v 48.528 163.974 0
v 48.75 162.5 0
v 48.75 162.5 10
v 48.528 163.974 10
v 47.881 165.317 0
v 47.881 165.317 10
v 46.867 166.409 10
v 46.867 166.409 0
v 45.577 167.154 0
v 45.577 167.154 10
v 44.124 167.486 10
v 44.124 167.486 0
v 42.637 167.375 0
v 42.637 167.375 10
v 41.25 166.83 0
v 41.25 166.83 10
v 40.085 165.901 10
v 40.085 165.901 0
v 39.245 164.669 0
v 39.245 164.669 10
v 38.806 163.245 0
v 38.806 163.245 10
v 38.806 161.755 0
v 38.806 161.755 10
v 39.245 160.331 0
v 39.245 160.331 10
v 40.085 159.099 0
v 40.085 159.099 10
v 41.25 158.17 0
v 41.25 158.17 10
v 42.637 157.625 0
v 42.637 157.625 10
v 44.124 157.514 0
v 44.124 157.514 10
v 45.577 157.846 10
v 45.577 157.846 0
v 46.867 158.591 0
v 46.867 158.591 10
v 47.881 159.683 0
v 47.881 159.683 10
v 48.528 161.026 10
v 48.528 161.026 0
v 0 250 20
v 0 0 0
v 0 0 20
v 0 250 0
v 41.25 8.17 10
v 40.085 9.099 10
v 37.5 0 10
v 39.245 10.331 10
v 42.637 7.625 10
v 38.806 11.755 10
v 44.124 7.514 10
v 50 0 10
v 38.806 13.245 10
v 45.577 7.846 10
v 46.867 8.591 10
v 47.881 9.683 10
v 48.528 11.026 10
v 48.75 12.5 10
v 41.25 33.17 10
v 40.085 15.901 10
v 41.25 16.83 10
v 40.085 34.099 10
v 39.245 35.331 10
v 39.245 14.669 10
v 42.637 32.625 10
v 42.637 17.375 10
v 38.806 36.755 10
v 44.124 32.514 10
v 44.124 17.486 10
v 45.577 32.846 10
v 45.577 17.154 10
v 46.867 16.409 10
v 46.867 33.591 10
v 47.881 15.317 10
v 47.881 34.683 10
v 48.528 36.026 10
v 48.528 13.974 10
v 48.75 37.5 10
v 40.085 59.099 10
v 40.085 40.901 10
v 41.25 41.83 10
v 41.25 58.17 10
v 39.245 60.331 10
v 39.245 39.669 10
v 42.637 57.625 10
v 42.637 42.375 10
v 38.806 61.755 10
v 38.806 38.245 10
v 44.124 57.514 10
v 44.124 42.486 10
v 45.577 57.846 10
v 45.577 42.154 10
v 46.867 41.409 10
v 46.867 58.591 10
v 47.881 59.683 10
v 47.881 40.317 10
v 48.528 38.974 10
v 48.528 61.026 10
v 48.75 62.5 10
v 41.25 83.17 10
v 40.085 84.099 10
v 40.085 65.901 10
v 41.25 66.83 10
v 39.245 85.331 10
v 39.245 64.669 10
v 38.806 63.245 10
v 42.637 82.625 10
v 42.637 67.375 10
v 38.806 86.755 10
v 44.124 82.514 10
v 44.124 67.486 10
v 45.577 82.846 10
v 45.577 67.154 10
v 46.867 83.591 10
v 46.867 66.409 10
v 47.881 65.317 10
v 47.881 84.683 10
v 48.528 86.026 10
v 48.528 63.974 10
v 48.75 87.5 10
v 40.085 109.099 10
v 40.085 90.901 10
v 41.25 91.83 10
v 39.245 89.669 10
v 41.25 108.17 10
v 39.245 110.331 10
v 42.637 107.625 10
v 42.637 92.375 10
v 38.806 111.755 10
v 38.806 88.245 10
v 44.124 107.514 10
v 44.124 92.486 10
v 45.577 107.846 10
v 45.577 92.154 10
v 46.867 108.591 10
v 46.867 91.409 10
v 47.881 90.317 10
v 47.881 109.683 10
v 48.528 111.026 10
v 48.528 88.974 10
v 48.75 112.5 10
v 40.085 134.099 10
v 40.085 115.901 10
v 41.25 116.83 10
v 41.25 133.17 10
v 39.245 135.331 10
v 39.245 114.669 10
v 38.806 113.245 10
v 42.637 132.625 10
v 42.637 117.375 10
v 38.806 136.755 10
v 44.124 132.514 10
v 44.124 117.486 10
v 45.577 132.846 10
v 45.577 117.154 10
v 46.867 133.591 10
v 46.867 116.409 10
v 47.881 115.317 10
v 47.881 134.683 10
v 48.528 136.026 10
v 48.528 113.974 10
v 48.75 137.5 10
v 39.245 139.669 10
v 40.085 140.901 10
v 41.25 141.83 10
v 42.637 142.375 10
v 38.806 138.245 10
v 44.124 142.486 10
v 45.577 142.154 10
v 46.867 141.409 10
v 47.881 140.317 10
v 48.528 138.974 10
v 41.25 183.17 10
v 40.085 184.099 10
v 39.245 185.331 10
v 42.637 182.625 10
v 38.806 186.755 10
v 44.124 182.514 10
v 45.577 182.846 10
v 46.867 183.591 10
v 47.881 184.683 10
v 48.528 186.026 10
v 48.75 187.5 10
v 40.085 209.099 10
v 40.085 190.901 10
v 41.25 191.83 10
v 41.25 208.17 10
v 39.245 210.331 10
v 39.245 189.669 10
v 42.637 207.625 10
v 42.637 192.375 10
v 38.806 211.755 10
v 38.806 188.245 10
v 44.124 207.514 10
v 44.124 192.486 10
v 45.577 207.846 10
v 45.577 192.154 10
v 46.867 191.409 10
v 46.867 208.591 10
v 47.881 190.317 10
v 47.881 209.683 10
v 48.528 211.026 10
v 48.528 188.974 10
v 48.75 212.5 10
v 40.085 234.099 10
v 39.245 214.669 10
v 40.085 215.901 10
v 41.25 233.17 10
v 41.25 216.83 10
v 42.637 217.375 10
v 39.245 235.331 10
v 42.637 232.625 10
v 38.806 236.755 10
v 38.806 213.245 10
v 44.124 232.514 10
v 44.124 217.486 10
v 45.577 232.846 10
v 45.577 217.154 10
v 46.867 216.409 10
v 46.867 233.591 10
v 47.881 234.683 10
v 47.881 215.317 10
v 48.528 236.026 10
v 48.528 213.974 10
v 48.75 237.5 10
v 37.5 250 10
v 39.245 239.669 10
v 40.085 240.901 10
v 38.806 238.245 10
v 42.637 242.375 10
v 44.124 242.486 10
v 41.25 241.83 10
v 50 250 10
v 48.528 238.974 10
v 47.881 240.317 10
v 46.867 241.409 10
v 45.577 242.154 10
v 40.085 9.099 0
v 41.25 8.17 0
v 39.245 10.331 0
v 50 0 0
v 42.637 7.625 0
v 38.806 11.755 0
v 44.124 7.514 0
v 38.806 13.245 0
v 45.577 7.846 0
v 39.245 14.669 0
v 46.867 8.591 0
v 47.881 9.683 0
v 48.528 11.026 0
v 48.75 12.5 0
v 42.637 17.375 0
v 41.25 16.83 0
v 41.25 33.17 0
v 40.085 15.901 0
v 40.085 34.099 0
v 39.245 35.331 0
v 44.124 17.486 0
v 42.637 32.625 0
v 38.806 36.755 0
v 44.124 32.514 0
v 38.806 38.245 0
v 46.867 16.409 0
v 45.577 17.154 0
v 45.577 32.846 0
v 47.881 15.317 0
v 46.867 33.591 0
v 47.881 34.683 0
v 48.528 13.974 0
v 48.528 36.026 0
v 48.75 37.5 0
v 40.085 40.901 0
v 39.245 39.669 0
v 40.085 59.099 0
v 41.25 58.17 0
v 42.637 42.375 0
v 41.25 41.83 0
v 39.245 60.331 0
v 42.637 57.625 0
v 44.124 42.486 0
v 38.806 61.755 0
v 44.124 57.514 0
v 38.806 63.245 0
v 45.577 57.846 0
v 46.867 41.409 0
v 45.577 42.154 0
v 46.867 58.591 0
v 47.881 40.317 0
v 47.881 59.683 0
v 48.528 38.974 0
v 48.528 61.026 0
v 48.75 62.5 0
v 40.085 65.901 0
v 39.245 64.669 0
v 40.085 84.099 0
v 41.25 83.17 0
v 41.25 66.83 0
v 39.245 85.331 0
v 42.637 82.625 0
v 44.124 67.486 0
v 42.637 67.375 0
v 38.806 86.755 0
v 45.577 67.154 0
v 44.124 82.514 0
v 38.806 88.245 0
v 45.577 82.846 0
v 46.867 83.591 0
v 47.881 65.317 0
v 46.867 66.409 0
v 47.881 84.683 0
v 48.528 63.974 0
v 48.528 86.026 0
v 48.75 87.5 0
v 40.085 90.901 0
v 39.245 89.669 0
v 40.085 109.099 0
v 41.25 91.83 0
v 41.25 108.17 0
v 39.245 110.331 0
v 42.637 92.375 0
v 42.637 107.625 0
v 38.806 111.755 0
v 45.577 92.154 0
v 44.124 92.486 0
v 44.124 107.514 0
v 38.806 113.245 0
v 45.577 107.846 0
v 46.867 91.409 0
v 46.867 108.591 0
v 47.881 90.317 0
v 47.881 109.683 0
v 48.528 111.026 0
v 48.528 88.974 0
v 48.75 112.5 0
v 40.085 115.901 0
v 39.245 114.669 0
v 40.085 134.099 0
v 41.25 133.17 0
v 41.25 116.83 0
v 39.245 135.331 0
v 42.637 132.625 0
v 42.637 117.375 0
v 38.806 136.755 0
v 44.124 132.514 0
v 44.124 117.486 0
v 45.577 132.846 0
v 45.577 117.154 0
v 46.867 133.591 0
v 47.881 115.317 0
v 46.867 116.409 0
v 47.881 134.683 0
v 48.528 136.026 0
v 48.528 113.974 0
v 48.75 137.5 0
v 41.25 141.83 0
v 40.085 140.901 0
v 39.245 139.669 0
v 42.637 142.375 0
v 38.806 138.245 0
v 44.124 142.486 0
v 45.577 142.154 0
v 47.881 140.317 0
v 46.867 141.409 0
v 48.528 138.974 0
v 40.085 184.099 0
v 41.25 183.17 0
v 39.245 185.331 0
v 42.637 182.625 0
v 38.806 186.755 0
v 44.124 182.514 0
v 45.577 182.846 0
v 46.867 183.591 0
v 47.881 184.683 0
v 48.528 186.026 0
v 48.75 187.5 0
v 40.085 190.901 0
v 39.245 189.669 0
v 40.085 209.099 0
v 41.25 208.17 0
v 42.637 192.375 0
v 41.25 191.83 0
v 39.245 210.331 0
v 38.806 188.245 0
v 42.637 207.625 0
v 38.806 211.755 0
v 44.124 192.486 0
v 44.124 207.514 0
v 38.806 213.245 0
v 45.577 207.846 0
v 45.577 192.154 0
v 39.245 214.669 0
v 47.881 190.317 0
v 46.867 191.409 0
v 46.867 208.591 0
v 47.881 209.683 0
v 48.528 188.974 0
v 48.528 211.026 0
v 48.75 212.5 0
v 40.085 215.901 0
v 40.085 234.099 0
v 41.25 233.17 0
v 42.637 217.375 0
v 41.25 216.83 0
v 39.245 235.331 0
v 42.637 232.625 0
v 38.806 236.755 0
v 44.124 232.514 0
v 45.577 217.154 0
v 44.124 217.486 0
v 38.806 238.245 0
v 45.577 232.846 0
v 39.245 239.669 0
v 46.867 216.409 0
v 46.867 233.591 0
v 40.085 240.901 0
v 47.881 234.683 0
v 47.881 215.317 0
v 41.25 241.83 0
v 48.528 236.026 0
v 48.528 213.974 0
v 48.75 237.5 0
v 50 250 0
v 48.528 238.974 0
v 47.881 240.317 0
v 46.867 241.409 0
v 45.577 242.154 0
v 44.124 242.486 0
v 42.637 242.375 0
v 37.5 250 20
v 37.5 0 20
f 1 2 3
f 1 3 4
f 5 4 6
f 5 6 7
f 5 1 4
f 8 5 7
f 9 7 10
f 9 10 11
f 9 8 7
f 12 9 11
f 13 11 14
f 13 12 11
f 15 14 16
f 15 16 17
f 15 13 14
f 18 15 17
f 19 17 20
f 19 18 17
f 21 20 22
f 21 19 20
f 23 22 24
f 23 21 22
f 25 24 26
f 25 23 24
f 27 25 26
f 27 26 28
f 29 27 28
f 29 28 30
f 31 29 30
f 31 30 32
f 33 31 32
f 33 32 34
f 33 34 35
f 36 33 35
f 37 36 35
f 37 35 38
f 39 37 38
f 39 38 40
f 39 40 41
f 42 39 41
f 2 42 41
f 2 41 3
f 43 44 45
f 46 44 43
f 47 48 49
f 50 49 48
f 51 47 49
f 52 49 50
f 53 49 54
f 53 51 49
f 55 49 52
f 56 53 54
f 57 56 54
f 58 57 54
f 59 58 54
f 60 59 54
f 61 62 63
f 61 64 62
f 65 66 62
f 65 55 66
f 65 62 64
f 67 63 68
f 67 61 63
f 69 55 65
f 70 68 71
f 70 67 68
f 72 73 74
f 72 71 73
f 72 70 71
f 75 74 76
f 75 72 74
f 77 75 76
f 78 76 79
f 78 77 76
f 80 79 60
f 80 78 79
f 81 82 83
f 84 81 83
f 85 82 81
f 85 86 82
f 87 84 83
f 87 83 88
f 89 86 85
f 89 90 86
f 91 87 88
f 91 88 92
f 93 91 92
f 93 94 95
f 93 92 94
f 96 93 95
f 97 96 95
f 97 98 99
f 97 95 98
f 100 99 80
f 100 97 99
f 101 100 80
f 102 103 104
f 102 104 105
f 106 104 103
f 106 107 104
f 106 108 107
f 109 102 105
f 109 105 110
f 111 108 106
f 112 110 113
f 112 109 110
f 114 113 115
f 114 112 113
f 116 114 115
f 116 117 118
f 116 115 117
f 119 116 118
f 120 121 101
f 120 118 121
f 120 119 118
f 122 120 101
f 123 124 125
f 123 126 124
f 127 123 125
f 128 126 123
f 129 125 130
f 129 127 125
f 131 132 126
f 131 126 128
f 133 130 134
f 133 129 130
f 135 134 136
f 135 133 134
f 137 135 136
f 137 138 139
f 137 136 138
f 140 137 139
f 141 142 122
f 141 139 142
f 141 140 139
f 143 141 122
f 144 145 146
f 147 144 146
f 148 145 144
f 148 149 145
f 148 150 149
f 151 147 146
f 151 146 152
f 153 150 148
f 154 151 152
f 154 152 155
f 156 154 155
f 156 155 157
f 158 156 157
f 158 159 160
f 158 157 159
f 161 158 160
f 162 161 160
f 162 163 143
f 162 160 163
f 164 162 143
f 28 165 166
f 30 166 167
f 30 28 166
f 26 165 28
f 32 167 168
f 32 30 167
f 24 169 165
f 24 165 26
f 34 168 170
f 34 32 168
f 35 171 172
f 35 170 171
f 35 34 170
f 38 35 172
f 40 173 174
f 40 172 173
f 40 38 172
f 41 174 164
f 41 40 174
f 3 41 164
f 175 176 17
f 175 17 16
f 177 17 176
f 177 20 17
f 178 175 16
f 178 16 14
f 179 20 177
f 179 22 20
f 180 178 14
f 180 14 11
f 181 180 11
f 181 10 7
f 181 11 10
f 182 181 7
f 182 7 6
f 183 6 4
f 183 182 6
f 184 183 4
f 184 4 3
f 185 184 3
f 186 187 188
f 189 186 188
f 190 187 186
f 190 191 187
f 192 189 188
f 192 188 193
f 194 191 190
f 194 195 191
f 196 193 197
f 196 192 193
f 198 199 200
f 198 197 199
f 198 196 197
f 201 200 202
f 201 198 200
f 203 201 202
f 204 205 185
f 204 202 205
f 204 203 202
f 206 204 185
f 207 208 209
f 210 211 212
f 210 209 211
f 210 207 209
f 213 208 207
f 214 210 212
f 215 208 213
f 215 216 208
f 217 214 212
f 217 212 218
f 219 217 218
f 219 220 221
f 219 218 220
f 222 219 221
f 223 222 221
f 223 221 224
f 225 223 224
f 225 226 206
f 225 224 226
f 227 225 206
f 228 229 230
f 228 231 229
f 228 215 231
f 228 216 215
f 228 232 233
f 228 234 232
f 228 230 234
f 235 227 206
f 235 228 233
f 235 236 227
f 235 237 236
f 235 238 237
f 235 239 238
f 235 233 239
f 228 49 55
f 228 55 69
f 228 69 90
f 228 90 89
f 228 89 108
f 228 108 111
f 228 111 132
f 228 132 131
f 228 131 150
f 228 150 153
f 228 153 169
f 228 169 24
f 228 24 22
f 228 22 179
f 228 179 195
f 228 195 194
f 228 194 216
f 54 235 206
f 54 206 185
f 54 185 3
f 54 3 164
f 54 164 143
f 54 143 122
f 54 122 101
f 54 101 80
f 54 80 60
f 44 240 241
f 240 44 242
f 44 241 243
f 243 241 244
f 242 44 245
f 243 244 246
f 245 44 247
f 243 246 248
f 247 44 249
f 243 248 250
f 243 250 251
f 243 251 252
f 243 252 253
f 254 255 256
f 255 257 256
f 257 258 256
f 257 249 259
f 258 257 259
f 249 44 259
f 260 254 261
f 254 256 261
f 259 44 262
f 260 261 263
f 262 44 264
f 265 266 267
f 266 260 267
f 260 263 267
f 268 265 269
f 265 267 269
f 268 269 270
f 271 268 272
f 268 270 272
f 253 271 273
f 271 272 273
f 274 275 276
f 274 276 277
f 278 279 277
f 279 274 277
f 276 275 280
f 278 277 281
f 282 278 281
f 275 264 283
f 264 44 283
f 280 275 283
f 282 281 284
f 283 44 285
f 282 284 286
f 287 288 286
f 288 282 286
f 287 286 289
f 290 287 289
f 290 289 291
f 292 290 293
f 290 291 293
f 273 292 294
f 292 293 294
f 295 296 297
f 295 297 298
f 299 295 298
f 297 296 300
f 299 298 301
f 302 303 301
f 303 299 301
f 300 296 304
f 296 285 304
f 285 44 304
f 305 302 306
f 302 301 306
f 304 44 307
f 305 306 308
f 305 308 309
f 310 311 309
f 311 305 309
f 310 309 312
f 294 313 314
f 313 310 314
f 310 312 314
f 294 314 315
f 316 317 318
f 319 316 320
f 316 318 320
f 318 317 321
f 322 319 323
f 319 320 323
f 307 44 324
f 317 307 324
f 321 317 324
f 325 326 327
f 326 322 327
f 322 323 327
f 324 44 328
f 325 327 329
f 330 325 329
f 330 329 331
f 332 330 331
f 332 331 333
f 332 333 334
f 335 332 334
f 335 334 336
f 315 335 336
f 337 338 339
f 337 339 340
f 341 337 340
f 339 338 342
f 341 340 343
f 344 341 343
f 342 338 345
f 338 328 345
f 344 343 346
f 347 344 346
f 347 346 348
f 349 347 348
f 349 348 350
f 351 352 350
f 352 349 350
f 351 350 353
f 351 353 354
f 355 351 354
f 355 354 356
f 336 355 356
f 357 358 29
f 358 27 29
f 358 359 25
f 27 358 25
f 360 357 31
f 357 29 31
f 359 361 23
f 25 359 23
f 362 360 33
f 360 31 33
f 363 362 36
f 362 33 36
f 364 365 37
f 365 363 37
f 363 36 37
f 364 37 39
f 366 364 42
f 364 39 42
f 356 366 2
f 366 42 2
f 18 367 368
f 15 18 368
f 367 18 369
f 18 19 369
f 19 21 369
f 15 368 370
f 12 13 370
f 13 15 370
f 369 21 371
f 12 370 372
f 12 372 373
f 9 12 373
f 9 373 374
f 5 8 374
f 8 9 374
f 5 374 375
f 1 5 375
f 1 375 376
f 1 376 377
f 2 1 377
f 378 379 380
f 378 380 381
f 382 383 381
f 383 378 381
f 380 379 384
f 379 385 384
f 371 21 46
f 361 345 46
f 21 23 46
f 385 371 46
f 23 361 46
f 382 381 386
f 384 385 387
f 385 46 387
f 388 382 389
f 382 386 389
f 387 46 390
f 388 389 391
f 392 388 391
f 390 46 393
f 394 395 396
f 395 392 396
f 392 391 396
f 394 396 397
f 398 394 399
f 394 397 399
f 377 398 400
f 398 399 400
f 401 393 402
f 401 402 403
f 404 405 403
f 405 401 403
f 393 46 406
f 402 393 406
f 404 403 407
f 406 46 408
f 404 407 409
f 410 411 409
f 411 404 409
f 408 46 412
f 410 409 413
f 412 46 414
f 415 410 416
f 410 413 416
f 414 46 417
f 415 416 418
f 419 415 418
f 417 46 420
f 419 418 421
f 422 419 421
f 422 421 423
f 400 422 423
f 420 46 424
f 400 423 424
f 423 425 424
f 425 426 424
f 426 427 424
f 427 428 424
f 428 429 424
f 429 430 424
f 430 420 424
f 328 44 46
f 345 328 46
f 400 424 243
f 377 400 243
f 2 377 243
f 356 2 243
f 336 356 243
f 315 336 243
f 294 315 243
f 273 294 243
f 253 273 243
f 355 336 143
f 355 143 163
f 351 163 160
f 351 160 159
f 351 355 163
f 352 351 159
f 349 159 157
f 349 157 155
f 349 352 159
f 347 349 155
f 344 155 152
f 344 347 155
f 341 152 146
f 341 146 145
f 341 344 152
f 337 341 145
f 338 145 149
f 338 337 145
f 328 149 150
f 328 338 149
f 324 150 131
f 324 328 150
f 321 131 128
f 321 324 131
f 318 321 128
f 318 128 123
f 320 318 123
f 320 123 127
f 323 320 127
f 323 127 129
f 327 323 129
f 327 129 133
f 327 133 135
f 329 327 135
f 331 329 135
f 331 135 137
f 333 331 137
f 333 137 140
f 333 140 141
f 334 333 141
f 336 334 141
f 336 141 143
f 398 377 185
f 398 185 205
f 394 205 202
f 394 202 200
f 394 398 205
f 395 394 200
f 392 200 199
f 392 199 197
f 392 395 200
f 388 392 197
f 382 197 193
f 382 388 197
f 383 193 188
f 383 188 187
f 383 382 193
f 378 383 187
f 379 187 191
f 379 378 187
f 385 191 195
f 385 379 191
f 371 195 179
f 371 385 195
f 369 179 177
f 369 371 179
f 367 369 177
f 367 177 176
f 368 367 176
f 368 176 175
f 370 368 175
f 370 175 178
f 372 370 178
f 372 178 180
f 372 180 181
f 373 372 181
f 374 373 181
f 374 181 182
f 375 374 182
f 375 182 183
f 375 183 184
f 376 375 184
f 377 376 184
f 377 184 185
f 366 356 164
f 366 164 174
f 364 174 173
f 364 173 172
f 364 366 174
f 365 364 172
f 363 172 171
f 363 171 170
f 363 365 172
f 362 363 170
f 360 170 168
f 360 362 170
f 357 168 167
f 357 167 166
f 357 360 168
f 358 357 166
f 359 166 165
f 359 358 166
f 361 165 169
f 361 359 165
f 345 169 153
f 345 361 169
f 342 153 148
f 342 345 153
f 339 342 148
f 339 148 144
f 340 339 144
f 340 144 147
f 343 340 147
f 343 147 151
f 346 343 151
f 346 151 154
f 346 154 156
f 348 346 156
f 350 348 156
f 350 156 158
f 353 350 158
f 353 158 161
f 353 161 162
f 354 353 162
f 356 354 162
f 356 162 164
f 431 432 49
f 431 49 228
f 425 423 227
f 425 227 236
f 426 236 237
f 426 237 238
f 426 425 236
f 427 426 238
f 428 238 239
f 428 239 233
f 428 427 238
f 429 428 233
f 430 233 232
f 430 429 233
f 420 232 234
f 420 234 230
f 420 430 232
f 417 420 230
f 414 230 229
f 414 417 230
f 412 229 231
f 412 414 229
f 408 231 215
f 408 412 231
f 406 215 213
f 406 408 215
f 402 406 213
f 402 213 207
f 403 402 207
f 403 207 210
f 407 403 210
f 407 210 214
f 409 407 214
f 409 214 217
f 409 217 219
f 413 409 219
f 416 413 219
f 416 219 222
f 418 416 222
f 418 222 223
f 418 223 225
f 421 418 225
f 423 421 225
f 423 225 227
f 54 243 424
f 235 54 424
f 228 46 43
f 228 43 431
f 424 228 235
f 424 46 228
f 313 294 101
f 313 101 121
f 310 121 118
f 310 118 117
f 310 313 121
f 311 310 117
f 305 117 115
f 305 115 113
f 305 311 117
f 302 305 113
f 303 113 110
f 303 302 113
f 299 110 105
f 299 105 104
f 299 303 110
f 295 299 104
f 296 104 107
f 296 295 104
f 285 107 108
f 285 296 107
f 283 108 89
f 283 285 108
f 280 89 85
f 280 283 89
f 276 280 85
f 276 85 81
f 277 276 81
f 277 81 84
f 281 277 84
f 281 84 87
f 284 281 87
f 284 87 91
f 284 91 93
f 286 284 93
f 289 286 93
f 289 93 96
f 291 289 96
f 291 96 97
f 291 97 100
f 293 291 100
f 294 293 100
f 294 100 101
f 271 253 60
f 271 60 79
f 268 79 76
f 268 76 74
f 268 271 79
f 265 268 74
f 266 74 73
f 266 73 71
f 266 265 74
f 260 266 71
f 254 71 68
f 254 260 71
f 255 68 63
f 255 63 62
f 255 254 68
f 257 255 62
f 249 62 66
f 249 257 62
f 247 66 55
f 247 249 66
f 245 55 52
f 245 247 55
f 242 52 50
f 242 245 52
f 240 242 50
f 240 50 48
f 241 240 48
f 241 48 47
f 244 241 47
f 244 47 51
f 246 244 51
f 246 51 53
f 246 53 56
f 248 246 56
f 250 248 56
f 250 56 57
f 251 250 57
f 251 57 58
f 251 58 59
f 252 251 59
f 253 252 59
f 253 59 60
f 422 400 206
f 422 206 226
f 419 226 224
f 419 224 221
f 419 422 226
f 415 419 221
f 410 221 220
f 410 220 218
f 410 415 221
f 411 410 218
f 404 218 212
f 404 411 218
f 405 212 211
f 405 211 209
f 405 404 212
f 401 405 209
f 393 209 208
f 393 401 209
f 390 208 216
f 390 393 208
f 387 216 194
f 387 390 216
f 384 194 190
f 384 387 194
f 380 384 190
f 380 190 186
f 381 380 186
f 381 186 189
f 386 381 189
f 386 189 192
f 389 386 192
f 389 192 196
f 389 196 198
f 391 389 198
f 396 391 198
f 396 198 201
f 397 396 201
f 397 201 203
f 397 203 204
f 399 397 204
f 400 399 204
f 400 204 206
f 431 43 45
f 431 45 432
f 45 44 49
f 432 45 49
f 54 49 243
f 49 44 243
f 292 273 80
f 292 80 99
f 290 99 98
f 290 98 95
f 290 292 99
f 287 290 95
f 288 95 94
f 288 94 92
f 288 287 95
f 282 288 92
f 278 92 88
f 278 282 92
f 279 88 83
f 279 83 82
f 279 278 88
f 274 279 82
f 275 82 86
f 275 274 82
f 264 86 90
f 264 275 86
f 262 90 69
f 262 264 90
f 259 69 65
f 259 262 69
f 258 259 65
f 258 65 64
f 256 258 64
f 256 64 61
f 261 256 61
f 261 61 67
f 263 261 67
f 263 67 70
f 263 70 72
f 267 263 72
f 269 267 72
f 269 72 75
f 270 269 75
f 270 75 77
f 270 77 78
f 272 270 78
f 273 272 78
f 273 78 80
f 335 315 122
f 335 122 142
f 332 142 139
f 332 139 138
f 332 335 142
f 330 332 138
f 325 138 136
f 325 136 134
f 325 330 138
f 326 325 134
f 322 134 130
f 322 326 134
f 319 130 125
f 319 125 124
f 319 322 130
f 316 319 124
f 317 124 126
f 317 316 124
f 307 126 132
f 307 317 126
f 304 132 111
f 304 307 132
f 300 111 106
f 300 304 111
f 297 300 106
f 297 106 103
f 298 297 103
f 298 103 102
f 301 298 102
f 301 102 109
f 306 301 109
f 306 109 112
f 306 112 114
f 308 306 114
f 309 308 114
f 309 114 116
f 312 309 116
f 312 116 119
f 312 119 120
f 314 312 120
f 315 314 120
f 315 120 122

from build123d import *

# Parameters (mm, degrees)
SKETCH1_W           = 50
SKETCH1_H           = 250
BOSS_EXTRUDE2_DEPTH = 20
SKETCH1_4_W         = 50
SKETCH1_4_H         = 250
BOSS_EXTRUDE3_DEPTH = 10
SKETCH1_8_R         = 5
CUT_EXTRUDE7_DEPTH  = 20
CUT_EXTRUDE8_START  = -10
SKETCH4_W           = 12.5
SKETCH4_H           = 250
SKETCH4_R           = 5
CUT_EXTRUDE8_DEPTH  = 10


with BuildPart() as part:
    # Sketch1 → Boss-Extrude2 (new body)
    with BuildSketch(Plane.XY):
        with Locations((25, 125)):
            Rectangle(SKETCH1_W, SKETCH1_H)
    extrude(amount=BOSS_EXTRUDE2_DEPTH)

    # Sketch1_4 → Boss-Extrude3 (add)
    with BuildSketch(Plane.XY):
        with Locations((25, 125)):
            Rectangle(SKETCH1_4_W, SKETCH1_4_H)
    extrude(amount=BOSS_EXTRUDE3_DEPTH)

    # Sketch1_8 → Cut-Extrude7 (cut)
    with BuildSketch(Plane.XY):
        with Locations((43.75, 237.5)):
            Circle(SKETCH1_8_R)
        with Locations((43.75, 212.5)):
            Circle(SKETCH1_8_R)
        with Locations((43.75, 187.5)):
            Circle(SKETCH1_8_R)
        with Locations((43.75, 162.5)):
            Circle(SKETCH1_8_R)
        with Locations((43.75, 137.5)):
            Circle(SKETCH1_8_R)
        with Locations((43.75, 112.5)):
            Circle(SKETCH1_8_R)
        with Locations((43.75, 87.5)):
            Circle(SKETCH1_8_R)
        with Locations((43.75, 62.5)):
            Circle(SKETCH1_8_R)
        with Locations((43.75, 37.5)):
            Circle(SKETCH1_8_R)
        with Locations((43.75, 12.5)):
            Circle(SKETCH1_8_R)
    extrude(amount=CUT_EXTRUDE7_DEPTH, mode=Mode.SUBTRACT)

    # Sketch4 → Cut-Extrude8 (cut)
    with BuildSketch(Plane.XY.offset(20).offset(CUT_EXTRUDE8_START)):
        with Locations((43.75, 125)):
            Rectangle(SKETCH4_W, SKETCH4_H)
        with Locations((43.75, 12.5)):
            Circle(SKETCH4_R, mode=Mode.SUBTRACT)
        with Locations((43.75, 37.5)):
            Circle(SKETCH4_R, mode=Mode.SUBTRACT)
        with Locations((43.75, 62.5)):
            Circle(SKETCH4_R, mode=Mode.SUBTRACT)
        with Locations((43.75, 87.5)):
            Circle(SKETCH4_R, mode=Mode.SUBTRACT)
        with Locations((43.75, 112.5)):
            Circle(SKETCH4_R, mode=Mode.SUBTRACT)
        with Locations((43.75, 137.5)):
            Circle(SKETCH4_R, mode=Mode.SUBTRACT)
        with Locations((43.75, 162.5)):
            Circle(SKETCH4_R, mode=Mode.SUBTRACT)
        with Locations((43.75, 187.5)):
            Circle(SKETCH4_R, mode=Mode.SUBTRACT)
        with Locations((43.75, 212.5)):
            Circle(SKETCH4_R, mode=Mode.SUBTRACT)
        with Locations((43.75, 237.5)):
            Circle(SKETCH4_R, mode=Mode.SUBTRACT)
    extrude(amount=CUT_EXTRUDE8_DEPTH, mode=Mode.SUBTRACT)


solid = part.part
